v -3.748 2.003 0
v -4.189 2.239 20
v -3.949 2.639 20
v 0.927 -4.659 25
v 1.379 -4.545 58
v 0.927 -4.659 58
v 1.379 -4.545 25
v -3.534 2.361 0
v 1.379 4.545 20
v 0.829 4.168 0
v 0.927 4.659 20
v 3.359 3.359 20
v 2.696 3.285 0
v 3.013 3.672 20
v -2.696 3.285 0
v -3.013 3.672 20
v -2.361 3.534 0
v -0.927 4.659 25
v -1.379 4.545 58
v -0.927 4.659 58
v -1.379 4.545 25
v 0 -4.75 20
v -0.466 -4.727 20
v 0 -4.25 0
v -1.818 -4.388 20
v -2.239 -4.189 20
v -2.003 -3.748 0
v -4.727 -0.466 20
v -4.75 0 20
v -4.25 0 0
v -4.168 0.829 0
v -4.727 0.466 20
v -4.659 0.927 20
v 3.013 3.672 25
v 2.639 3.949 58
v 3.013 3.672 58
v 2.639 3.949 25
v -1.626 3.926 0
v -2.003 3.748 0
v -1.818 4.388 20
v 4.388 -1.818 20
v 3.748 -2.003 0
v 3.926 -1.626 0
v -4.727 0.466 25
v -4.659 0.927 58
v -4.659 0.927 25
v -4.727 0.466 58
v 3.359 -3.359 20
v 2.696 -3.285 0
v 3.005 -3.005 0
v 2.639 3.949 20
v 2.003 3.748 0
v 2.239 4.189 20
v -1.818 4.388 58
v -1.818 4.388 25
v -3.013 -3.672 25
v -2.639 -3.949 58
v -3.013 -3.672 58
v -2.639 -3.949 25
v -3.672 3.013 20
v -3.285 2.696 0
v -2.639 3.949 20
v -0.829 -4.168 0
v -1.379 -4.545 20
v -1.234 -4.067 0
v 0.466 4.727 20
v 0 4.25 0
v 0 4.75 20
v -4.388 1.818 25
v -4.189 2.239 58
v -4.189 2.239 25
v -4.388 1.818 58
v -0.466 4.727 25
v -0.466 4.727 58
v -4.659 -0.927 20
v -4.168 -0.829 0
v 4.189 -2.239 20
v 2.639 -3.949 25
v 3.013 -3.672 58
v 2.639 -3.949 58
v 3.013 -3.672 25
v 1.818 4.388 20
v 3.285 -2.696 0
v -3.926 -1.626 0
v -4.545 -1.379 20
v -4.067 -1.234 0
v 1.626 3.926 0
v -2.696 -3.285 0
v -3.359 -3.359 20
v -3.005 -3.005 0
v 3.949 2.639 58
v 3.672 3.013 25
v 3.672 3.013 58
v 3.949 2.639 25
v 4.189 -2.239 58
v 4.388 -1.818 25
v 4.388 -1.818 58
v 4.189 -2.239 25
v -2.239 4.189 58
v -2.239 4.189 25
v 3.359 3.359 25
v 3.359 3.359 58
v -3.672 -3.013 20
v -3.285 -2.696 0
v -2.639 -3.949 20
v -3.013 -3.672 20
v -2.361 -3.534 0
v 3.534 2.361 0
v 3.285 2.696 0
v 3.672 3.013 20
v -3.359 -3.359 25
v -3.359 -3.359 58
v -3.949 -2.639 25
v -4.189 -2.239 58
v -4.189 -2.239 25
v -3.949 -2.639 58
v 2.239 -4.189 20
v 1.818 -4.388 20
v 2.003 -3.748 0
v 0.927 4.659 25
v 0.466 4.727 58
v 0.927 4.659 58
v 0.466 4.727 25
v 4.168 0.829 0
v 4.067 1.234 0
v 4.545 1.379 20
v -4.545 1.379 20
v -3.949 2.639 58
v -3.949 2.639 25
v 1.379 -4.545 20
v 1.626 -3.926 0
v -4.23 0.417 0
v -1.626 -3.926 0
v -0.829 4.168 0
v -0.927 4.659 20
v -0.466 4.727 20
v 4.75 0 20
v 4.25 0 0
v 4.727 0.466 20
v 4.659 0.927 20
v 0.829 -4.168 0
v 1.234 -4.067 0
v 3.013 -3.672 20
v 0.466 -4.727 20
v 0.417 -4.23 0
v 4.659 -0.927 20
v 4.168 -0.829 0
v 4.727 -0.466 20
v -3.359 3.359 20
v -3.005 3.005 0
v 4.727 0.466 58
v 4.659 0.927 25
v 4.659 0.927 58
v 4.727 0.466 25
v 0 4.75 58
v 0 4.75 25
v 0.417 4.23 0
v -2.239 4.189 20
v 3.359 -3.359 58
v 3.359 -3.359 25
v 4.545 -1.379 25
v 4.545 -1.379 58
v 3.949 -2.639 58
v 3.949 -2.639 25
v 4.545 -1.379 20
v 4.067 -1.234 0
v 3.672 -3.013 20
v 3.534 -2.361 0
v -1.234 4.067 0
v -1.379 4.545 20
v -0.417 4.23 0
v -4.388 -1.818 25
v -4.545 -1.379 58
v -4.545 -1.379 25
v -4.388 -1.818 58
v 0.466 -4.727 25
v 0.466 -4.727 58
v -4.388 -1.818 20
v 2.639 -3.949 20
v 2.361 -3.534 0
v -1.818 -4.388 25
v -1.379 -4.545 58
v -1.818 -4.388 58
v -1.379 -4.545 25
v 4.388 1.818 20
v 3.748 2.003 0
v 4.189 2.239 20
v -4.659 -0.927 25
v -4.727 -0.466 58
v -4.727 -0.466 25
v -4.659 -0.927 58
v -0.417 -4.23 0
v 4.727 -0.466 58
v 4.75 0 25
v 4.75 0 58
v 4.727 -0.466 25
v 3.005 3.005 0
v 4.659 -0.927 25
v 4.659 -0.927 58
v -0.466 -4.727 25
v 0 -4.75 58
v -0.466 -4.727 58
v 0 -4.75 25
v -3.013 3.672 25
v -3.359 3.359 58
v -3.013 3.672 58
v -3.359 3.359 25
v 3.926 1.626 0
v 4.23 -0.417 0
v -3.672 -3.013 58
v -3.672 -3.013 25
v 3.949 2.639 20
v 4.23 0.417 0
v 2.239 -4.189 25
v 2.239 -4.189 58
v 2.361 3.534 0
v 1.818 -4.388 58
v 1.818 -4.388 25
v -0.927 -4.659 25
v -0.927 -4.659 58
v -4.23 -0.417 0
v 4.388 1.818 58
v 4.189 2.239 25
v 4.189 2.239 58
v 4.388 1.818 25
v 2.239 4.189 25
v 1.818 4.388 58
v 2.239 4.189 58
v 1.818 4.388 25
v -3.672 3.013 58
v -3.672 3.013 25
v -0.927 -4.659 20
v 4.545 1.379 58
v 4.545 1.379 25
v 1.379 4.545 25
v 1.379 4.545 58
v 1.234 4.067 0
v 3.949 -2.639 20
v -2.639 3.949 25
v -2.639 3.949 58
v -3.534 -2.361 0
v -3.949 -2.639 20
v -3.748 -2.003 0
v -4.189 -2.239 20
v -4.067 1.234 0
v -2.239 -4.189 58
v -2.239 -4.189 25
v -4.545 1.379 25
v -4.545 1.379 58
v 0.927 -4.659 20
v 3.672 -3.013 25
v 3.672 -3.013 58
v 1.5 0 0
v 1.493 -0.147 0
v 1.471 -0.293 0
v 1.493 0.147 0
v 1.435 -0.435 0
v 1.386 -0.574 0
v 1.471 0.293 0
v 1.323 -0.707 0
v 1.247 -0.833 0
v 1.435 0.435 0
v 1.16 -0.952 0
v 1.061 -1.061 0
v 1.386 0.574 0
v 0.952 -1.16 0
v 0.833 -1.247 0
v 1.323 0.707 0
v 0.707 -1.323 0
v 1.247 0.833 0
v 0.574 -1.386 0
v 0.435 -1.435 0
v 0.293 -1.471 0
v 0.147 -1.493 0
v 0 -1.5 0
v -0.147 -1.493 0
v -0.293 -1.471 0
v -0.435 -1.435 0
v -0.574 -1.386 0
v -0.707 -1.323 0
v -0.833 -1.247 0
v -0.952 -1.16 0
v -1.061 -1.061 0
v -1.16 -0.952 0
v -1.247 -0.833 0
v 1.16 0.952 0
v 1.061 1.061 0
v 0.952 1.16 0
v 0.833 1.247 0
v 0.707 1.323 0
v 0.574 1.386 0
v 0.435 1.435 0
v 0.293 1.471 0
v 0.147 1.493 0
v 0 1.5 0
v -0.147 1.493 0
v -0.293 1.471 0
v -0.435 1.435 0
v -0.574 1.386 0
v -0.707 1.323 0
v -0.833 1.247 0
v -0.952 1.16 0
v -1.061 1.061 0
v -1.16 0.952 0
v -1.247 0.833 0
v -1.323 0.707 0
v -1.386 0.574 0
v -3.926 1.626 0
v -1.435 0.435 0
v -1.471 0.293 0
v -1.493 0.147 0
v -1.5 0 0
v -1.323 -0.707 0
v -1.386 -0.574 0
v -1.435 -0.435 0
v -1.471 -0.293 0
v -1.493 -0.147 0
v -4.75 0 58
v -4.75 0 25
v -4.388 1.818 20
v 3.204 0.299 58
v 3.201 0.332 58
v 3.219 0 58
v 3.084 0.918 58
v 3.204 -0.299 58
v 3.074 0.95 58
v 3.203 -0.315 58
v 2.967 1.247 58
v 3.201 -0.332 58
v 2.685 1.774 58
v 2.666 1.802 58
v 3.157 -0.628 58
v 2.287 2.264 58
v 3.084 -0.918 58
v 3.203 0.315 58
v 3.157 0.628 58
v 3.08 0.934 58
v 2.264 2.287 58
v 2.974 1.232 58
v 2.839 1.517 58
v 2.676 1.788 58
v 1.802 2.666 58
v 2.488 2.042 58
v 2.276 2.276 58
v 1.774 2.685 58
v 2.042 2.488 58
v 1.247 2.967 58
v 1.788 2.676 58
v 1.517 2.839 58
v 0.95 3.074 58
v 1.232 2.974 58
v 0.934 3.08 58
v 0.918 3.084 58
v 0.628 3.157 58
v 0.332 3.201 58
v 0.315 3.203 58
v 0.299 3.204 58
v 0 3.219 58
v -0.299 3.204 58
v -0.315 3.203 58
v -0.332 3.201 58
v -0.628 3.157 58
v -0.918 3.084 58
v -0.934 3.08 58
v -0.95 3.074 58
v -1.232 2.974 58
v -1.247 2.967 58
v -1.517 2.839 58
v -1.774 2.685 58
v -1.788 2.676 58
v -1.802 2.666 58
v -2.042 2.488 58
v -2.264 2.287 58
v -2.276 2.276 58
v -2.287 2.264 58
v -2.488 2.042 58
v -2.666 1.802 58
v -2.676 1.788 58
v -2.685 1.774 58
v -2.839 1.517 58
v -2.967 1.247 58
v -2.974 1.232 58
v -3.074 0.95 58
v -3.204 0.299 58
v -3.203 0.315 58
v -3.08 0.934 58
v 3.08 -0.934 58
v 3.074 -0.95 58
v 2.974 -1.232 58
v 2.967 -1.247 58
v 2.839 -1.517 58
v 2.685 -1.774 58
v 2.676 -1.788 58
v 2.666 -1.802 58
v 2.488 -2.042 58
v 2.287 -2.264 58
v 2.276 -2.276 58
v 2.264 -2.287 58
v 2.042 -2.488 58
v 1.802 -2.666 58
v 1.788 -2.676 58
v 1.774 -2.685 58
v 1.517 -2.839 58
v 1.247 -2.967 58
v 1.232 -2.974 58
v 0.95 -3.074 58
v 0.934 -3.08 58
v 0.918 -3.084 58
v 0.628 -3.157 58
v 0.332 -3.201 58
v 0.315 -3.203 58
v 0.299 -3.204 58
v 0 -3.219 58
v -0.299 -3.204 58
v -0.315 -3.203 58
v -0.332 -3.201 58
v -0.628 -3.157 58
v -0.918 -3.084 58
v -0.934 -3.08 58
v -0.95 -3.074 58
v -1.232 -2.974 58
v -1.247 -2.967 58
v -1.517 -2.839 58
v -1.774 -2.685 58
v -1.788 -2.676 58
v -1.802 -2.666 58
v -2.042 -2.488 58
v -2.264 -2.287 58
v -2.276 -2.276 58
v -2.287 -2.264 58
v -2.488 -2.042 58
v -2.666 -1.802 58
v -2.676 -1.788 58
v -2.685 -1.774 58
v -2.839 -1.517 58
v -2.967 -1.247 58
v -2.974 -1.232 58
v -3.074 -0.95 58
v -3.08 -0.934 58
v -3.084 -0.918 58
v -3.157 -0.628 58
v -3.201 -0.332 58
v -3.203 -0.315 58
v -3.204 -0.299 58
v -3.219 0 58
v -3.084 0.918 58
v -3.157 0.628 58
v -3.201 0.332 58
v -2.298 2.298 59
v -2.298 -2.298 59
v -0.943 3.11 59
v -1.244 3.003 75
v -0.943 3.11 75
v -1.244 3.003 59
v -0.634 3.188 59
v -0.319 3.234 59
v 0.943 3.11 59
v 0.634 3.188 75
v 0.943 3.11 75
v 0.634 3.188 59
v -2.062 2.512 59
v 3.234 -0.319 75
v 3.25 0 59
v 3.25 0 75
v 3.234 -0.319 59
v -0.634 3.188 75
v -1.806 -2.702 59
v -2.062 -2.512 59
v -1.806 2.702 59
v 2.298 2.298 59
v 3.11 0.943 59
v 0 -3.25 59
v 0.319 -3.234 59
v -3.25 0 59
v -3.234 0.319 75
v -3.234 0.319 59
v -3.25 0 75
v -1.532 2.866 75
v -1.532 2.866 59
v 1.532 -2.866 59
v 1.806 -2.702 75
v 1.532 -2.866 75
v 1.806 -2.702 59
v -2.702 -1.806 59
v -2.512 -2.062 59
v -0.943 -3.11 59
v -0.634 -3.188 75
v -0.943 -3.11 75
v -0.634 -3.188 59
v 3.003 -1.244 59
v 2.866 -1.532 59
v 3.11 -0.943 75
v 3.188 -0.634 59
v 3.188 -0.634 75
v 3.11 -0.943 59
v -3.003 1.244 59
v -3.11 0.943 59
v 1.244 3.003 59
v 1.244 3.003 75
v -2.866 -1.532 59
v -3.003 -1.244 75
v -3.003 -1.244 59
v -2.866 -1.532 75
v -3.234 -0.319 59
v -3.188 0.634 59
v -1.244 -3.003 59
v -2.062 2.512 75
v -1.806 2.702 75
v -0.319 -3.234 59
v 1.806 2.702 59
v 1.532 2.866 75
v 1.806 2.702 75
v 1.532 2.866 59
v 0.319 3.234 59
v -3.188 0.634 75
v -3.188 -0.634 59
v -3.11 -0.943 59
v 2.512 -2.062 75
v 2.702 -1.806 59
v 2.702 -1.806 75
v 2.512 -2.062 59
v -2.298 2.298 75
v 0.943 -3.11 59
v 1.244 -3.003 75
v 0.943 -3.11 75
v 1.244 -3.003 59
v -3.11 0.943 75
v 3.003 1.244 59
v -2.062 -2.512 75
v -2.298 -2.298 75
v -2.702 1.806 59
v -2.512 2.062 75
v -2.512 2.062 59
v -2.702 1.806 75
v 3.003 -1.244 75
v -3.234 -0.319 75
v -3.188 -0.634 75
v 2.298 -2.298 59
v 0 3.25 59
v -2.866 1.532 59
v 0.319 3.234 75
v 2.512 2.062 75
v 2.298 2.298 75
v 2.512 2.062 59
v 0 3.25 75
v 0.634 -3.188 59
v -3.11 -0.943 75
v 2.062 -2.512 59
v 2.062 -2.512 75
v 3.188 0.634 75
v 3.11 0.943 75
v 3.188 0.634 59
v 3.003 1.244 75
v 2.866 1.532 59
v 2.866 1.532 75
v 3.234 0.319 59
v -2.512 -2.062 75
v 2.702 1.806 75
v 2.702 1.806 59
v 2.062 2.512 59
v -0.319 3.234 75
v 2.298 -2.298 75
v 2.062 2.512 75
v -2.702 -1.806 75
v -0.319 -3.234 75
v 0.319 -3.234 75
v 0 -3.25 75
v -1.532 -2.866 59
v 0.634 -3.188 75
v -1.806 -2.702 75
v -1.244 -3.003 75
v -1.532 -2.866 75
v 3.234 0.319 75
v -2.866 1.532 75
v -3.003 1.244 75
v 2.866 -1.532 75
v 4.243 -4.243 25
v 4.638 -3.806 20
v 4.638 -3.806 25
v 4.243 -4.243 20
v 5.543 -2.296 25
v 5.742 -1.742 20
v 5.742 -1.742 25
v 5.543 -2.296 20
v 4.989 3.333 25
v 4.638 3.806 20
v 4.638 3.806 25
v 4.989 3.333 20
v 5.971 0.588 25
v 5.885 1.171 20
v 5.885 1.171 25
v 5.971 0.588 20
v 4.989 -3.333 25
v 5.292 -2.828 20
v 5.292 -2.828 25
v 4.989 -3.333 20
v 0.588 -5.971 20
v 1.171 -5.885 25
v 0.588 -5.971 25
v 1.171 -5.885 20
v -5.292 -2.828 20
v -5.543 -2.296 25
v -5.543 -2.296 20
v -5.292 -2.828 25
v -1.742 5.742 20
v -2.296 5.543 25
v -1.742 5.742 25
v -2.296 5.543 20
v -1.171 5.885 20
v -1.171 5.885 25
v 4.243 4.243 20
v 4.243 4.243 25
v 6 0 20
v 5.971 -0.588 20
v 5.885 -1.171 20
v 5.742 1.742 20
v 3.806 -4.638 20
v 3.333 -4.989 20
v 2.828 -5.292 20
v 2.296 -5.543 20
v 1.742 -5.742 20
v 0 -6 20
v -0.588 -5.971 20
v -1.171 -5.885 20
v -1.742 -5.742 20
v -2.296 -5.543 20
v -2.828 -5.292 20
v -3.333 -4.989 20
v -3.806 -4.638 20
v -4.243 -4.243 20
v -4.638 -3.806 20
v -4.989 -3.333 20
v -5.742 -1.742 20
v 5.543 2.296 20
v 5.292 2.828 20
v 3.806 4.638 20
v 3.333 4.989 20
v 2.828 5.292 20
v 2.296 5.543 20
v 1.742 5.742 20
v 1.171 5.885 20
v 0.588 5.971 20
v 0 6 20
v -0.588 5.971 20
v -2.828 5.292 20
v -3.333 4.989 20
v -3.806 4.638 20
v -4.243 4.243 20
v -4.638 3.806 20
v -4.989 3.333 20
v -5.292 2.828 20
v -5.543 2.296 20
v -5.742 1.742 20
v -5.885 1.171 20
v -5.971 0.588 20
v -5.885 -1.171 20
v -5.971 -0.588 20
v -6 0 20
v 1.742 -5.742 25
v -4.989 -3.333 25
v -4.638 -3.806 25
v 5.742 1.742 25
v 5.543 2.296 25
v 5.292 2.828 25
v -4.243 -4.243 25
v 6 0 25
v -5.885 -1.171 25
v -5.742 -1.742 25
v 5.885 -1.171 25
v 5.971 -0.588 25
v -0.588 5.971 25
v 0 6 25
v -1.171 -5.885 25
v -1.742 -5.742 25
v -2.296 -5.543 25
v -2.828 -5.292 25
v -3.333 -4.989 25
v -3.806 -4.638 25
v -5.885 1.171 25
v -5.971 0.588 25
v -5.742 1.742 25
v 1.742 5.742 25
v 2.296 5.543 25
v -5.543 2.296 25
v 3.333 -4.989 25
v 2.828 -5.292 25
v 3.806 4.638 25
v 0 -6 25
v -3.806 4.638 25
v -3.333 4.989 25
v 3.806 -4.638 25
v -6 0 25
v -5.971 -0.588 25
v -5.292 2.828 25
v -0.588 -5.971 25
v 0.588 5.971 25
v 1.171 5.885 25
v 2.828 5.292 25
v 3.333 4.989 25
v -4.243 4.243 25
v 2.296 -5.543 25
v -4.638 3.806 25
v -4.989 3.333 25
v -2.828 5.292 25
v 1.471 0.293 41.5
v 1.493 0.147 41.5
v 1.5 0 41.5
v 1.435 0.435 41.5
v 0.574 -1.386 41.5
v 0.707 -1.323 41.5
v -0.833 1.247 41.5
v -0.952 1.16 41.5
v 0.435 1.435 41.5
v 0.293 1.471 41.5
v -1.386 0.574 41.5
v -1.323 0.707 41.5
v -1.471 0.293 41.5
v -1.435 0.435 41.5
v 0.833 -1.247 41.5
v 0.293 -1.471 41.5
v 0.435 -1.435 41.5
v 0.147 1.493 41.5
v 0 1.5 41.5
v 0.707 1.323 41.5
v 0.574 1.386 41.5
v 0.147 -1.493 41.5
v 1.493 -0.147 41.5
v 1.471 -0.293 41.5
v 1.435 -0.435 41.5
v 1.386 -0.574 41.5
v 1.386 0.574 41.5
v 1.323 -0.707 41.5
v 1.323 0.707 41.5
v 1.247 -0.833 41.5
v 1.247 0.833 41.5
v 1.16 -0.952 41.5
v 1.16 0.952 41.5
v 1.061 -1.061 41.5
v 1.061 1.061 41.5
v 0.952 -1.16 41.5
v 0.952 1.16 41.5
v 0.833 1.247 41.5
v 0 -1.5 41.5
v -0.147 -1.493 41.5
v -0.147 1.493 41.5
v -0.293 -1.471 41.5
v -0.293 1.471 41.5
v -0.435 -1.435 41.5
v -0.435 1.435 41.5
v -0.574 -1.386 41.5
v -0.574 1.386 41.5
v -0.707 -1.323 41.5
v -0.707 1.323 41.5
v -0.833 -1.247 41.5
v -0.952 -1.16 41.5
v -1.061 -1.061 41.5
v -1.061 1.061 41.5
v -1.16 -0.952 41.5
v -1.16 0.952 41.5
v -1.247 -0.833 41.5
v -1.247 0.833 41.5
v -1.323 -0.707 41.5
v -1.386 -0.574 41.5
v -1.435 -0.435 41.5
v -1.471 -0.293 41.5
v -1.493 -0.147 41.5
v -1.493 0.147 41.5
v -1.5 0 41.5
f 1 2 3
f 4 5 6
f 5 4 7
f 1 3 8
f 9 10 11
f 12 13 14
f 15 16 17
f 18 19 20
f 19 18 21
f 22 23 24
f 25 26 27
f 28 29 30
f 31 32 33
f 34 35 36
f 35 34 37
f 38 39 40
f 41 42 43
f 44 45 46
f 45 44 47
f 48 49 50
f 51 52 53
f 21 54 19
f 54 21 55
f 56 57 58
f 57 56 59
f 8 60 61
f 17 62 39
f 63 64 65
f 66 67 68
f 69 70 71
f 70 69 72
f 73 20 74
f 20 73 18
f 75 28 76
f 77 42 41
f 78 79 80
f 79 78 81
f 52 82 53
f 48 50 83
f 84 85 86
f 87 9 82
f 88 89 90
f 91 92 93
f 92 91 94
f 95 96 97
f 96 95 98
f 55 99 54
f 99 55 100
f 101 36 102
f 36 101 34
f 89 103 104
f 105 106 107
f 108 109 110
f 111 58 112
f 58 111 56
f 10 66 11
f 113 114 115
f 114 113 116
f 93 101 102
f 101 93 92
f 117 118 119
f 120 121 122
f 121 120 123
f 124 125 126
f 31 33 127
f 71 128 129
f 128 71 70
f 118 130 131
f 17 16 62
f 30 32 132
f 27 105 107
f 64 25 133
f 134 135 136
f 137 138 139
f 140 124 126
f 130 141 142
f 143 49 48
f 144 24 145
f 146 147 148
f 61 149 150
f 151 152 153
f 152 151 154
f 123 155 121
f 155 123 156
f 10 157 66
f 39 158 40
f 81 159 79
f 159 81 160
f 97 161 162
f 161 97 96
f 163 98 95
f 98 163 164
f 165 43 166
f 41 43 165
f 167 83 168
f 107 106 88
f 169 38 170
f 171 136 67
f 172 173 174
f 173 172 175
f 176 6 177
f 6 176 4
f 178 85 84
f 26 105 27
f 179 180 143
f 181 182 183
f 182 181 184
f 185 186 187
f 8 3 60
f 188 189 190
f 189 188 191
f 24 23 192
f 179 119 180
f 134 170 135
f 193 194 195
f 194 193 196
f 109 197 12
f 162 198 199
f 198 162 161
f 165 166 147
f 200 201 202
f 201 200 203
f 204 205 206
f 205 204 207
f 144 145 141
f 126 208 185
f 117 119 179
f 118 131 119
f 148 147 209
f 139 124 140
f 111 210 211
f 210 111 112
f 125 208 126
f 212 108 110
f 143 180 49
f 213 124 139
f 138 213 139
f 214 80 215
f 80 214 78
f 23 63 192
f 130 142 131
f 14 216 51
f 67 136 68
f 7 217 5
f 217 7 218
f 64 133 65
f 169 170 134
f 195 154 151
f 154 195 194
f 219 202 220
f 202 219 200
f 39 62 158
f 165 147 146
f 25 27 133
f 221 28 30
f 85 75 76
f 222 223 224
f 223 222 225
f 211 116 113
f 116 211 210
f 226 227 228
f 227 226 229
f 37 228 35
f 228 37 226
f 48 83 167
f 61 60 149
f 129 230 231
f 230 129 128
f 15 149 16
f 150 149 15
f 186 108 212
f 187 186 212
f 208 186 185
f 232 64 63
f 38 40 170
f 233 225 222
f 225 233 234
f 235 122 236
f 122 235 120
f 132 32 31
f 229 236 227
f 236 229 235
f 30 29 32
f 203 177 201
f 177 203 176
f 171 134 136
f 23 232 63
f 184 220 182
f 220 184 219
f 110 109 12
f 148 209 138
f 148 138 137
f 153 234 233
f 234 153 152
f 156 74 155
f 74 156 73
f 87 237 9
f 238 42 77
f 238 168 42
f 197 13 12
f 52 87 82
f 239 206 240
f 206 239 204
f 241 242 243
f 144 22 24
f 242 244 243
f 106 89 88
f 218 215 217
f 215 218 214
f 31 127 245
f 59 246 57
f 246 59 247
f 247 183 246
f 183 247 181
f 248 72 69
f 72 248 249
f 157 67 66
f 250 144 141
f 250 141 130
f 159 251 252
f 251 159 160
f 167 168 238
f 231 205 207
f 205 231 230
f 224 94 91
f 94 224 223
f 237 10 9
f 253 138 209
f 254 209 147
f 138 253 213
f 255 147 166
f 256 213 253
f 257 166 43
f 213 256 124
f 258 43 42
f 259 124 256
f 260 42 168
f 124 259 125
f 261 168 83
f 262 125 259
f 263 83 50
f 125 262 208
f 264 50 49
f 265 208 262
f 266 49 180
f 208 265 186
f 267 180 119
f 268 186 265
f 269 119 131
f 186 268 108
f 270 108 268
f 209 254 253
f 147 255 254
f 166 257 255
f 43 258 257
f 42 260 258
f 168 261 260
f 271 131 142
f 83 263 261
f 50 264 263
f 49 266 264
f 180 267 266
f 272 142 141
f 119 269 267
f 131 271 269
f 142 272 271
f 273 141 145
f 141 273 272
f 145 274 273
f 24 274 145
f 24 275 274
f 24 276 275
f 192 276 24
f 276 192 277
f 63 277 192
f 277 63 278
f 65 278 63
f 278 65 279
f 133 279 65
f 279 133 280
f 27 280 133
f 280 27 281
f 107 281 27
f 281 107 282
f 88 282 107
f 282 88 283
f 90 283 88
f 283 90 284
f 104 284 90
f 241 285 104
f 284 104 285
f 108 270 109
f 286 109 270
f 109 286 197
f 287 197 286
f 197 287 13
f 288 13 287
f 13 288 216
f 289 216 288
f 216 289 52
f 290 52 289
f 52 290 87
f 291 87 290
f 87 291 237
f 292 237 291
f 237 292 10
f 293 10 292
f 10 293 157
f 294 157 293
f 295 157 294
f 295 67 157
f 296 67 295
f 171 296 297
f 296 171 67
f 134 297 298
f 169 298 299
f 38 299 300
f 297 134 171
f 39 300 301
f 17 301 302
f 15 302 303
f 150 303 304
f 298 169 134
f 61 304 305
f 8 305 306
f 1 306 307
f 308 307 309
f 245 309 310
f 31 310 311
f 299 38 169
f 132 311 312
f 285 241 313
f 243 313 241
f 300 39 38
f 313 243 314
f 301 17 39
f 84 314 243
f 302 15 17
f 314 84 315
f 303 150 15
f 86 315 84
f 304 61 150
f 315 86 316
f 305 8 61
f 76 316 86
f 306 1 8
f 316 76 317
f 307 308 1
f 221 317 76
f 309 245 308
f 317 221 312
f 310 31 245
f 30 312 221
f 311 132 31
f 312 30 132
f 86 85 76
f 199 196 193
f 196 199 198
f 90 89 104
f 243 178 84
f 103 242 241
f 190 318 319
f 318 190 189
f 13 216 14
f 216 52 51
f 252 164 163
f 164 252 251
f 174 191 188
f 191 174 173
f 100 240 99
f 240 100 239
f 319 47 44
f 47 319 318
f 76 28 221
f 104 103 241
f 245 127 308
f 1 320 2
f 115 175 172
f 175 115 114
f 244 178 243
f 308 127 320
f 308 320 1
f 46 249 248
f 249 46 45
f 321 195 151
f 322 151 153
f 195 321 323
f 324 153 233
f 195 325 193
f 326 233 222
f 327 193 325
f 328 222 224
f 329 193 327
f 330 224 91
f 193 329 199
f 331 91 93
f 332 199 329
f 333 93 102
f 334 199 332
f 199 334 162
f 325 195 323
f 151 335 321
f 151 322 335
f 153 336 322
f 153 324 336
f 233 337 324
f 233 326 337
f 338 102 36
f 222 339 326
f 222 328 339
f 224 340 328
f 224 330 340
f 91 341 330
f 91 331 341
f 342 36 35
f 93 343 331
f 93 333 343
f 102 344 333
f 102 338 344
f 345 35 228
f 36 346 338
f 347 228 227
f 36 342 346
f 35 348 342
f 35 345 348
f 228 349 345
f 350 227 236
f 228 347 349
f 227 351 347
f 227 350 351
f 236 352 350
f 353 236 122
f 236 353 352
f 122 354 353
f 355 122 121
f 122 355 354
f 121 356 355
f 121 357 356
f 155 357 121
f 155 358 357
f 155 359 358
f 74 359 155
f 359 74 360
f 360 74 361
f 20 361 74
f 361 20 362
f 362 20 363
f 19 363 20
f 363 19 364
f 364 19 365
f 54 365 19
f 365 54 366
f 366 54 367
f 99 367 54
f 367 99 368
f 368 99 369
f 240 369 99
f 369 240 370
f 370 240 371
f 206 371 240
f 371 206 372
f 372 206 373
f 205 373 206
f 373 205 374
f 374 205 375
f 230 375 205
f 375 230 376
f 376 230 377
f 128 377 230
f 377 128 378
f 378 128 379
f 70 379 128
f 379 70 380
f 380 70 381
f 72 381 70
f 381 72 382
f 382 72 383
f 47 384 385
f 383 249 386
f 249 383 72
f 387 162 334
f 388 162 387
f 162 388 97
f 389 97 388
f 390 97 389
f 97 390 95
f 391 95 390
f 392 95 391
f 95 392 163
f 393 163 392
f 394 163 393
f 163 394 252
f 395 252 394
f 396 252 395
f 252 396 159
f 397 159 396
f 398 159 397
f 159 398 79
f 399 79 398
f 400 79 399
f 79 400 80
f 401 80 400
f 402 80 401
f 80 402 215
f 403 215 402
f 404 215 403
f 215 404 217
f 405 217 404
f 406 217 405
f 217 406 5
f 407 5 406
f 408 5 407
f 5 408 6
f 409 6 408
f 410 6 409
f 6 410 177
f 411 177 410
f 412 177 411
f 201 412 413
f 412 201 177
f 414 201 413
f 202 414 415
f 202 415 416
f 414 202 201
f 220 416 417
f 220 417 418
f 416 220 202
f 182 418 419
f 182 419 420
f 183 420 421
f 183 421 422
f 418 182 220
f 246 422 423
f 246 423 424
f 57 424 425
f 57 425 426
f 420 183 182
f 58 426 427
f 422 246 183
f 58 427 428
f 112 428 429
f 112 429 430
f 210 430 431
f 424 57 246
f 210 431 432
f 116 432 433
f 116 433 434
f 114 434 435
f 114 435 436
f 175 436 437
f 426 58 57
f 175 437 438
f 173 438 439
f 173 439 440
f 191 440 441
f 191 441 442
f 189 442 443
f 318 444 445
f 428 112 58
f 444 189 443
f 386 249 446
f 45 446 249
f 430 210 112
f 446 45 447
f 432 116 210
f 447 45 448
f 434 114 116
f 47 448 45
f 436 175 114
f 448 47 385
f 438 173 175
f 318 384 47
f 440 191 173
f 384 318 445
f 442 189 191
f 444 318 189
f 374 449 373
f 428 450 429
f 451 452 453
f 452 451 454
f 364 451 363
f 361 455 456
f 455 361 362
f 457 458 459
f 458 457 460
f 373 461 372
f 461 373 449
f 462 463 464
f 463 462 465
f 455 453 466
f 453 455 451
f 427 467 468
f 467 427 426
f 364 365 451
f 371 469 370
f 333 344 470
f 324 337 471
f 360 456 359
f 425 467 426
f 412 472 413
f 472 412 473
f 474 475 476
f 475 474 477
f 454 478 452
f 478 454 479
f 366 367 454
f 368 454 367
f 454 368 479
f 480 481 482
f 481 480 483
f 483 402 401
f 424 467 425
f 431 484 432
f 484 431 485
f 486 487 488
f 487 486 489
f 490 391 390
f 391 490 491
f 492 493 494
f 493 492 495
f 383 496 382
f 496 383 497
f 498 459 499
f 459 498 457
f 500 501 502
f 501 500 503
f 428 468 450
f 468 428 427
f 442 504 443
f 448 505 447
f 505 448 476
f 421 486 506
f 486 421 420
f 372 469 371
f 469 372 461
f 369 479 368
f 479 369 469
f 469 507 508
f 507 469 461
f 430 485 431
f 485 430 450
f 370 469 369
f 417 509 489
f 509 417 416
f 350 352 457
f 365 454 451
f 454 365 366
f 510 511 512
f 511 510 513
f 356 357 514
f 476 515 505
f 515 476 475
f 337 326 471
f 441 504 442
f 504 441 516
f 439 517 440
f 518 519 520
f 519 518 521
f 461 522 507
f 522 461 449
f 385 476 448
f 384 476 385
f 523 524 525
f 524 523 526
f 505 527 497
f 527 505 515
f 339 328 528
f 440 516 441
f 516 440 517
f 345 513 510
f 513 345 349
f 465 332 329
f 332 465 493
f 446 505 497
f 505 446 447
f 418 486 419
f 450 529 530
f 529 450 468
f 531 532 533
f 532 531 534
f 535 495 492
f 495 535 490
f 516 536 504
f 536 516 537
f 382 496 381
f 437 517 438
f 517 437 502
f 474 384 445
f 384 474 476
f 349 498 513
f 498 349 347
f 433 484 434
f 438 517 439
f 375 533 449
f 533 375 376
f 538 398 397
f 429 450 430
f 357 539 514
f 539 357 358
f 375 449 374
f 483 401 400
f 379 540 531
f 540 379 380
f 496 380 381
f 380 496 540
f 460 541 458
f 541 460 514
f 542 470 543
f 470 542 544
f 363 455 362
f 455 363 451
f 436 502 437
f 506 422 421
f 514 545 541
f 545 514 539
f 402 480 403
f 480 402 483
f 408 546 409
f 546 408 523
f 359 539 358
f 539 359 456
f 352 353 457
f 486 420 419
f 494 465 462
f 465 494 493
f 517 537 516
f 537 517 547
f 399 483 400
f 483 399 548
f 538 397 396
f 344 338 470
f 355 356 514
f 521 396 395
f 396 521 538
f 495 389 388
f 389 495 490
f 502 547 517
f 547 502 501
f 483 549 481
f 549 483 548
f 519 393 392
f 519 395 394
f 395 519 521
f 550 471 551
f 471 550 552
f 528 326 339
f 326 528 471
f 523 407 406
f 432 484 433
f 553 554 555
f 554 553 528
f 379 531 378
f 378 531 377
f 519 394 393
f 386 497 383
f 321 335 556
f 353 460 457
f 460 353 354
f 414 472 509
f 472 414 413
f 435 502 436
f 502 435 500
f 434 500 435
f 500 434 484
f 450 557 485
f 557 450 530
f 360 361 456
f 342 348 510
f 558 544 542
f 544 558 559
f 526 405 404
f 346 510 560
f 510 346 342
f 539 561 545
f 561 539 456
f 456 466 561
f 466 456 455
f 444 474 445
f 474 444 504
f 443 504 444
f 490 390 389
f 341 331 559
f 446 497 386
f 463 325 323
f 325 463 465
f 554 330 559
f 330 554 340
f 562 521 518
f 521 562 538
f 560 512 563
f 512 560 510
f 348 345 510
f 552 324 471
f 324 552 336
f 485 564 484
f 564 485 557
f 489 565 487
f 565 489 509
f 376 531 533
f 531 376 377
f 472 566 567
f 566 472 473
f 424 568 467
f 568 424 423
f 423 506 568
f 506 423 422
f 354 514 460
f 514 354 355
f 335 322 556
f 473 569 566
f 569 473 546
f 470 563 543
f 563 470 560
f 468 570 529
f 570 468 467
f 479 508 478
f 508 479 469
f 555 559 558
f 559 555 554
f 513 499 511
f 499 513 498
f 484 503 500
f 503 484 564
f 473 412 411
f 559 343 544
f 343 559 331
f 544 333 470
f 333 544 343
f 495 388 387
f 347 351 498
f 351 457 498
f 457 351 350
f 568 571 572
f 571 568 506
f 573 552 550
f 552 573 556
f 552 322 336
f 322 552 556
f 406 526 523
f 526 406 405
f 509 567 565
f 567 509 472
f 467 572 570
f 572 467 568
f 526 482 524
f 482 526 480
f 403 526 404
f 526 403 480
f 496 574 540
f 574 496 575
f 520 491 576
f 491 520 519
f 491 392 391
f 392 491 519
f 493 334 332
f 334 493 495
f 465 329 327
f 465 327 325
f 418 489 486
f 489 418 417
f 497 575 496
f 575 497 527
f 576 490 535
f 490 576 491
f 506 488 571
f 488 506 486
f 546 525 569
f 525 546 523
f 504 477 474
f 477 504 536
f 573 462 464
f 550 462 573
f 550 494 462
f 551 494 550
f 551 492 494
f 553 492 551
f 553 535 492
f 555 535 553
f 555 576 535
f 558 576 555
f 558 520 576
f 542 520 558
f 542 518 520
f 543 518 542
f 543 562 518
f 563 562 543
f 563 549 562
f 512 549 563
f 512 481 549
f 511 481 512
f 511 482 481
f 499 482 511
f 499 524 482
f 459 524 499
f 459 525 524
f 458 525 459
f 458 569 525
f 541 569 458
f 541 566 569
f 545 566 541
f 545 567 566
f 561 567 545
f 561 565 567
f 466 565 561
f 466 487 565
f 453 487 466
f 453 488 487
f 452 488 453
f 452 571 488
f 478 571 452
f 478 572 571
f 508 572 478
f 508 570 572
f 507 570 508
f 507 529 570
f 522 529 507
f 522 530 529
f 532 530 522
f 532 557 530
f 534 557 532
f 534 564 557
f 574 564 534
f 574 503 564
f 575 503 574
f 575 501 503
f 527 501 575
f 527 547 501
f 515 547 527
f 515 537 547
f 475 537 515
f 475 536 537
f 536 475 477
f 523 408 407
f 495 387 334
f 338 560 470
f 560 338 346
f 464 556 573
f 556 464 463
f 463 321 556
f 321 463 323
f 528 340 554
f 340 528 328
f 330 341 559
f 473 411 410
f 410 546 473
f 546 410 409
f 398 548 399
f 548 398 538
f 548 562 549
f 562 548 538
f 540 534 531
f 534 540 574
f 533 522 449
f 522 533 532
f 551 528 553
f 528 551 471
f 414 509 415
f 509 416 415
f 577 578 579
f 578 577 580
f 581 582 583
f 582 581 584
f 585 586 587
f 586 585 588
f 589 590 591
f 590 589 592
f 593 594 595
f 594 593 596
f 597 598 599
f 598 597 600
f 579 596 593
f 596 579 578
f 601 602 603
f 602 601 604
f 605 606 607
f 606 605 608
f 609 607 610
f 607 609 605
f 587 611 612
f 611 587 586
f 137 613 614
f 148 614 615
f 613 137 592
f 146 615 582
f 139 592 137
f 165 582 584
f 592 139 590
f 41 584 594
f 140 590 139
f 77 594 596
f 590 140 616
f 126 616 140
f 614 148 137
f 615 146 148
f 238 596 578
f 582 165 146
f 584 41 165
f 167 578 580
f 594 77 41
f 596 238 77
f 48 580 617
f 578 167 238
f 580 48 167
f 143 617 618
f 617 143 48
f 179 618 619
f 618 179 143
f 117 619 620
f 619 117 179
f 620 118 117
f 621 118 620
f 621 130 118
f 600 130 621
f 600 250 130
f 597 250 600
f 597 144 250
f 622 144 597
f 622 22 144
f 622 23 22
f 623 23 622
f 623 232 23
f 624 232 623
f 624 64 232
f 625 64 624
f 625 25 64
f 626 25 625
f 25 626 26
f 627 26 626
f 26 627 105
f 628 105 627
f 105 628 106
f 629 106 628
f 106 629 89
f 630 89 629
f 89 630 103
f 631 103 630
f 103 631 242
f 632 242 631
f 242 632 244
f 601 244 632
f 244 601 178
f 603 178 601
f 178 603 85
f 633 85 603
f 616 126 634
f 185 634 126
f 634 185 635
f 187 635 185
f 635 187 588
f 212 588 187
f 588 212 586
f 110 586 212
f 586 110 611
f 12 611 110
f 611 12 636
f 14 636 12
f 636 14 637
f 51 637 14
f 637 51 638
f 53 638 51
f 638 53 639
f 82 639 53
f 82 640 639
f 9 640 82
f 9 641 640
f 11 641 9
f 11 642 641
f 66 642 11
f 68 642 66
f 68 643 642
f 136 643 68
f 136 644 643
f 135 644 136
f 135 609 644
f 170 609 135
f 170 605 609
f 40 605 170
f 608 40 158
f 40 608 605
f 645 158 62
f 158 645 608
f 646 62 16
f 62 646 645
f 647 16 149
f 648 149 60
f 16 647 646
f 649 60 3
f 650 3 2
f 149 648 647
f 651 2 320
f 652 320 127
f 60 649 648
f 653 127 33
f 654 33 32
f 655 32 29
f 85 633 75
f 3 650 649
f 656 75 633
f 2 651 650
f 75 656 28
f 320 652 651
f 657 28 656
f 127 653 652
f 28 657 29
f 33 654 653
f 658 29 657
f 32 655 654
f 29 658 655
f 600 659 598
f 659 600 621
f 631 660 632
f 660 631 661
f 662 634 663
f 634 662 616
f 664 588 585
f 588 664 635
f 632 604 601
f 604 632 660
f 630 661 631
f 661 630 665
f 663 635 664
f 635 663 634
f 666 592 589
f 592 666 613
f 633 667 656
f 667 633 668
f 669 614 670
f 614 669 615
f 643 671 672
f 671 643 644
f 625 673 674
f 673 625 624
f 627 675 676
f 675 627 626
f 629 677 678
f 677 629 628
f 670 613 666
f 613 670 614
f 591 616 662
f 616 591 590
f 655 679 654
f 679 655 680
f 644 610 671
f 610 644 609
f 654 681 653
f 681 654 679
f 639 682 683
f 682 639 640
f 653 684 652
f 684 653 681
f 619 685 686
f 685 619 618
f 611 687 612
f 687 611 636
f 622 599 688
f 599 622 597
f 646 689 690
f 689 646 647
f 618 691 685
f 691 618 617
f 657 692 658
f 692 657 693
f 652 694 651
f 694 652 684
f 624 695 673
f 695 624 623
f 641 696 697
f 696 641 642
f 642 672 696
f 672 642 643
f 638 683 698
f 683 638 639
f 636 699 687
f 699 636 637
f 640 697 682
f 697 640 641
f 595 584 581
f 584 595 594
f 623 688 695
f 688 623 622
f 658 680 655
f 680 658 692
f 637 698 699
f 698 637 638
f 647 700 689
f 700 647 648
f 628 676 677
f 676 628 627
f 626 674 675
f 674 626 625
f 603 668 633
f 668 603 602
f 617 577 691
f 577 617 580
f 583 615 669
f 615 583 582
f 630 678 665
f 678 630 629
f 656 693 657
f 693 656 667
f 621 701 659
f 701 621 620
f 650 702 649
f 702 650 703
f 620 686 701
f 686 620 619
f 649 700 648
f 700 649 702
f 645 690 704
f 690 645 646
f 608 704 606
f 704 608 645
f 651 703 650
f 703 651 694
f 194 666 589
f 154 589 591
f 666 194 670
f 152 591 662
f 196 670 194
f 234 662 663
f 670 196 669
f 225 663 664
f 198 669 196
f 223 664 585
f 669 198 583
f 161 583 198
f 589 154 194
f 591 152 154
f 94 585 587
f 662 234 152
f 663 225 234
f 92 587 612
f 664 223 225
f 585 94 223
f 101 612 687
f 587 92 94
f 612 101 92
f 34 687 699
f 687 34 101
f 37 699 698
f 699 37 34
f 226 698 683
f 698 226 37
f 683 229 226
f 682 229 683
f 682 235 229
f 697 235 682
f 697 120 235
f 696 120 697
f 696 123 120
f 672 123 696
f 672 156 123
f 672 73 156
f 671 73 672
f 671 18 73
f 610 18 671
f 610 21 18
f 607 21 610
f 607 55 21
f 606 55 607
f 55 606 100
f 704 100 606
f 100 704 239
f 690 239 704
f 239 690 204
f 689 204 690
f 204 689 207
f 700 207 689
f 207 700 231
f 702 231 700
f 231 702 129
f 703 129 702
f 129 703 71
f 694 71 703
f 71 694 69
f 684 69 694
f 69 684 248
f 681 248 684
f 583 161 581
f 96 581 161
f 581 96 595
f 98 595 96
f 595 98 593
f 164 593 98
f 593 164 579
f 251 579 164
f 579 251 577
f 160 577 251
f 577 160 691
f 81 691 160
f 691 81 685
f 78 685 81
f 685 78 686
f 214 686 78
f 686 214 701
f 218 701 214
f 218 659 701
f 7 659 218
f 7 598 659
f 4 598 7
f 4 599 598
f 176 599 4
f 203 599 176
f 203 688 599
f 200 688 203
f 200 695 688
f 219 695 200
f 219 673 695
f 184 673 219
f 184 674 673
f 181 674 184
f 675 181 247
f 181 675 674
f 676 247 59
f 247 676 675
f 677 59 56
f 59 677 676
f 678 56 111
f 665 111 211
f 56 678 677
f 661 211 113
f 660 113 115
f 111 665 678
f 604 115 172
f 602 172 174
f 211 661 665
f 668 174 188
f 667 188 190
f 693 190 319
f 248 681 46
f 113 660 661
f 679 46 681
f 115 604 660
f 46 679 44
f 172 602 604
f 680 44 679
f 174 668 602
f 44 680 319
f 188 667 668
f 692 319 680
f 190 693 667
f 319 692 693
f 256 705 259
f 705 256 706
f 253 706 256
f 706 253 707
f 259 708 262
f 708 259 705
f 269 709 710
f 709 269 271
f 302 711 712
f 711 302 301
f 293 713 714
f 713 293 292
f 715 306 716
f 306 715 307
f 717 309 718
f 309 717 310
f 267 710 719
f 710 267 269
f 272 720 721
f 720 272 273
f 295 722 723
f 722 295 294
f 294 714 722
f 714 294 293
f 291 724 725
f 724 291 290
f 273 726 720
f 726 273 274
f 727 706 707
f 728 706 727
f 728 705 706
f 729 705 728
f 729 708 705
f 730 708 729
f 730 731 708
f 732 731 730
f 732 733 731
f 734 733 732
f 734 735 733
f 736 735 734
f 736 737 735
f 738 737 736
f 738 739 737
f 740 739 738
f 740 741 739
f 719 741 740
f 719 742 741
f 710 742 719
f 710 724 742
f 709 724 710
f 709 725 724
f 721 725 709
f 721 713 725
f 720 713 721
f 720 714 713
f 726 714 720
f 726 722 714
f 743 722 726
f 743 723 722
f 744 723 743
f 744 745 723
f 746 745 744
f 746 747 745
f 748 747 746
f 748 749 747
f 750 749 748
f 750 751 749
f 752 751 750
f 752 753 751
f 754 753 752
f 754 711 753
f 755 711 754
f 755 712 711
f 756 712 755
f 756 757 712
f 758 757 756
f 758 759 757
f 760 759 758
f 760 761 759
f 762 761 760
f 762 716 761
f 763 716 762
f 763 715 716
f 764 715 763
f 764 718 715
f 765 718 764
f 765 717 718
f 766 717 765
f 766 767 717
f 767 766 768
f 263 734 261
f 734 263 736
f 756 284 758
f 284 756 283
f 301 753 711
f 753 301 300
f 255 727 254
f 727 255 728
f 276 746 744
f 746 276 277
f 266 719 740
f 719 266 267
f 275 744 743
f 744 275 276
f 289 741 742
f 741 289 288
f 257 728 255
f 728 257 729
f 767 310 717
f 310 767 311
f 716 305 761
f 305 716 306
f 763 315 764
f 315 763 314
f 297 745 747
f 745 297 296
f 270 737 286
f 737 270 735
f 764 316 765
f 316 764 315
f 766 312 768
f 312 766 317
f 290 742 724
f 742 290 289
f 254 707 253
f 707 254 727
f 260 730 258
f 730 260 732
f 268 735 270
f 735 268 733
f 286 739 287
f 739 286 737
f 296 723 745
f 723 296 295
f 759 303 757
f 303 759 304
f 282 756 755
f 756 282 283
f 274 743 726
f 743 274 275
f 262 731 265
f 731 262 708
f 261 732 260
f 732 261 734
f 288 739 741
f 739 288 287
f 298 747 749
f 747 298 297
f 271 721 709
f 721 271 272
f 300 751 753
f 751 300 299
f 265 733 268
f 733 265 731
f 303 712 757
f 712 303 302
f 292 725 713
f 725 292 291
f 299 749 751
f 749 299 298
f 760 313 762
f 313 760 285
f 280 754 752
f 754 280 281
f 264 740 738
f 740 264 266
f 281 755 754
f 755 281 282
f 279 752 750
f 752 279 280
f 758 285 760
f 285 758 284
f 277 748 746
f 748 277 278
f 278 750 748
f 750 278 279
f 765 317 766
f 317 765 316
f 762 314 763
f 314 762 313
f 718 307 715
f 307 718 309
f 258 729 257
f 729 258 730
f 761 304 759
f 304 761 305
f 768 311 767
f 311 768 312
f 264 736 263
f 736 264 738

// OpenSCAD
// Straight hose-barb reducer: 8 mm tubing (barbs) -> 5 mm tubing (barbs)
// Print orientation: standing upright along Z, centred on origin in X/Y

$fn = 64;

// ---- Dimensions (mm) ----
small_id      = 8;    // inner diameter of larger tubing
large_id      = 5;    // inner diameter of smaller tubing
bore          = 3;    // through-bore diameter
barb_count    = 2;    // number of barbs per section (stacked)
lower_z       = 20;   // height of lower barb section
collar_z      = 5;    // height of cylindrical collar
upper_z       = 16;   // height of upper barb section (8 mm tall each)
total_h       = lower_z + collar_z + upper_z;  // 41 mm overall

eps           = 0.5;  // overshoot for clean boolean cuts

// ---- Derived ----
pitch = (total_h - collar_z) / barb_count;  // centre-to-centre barb spacing

module barb_r(radial_size, z0, z1) {
    // Outer diameter grows/shrinks linearly from bottom to top,
    // then steps straight back to the bottom diameter (sawtooth profile)
    hull() {
        for (s = [0, 1])
            translate([0, 0, z0 + s * z1])
                cylinder(h = z1, d = radial_size + (s == 1 ? 2 * eps : 0));
    }
}

difference() {
    union() {
        // Lower section: 8 mm tubing barbs
        for (i = [0 : barb_count - 1])
            translate([0, 0, i * pitch])
                barb_r(7.5 + 2 * eps, 0, lower_z);

        // Collar
        translate([0, 0, lower_z])
            cylinder(h = collar_z, d = 12);

        // Upper section: 5 mm tubing barbs
        for (i = [0 : barb_count - 1])
            translate([0, 0, lower_z + collar_z + i * pitch])
                barb_r(6.5 - 2 * eps, 0, upper_z);
    }

    // Through bore
    translate([0, 0, -eps])
        cylinder(h = total_h + 2 * eps, d = bore);
}
